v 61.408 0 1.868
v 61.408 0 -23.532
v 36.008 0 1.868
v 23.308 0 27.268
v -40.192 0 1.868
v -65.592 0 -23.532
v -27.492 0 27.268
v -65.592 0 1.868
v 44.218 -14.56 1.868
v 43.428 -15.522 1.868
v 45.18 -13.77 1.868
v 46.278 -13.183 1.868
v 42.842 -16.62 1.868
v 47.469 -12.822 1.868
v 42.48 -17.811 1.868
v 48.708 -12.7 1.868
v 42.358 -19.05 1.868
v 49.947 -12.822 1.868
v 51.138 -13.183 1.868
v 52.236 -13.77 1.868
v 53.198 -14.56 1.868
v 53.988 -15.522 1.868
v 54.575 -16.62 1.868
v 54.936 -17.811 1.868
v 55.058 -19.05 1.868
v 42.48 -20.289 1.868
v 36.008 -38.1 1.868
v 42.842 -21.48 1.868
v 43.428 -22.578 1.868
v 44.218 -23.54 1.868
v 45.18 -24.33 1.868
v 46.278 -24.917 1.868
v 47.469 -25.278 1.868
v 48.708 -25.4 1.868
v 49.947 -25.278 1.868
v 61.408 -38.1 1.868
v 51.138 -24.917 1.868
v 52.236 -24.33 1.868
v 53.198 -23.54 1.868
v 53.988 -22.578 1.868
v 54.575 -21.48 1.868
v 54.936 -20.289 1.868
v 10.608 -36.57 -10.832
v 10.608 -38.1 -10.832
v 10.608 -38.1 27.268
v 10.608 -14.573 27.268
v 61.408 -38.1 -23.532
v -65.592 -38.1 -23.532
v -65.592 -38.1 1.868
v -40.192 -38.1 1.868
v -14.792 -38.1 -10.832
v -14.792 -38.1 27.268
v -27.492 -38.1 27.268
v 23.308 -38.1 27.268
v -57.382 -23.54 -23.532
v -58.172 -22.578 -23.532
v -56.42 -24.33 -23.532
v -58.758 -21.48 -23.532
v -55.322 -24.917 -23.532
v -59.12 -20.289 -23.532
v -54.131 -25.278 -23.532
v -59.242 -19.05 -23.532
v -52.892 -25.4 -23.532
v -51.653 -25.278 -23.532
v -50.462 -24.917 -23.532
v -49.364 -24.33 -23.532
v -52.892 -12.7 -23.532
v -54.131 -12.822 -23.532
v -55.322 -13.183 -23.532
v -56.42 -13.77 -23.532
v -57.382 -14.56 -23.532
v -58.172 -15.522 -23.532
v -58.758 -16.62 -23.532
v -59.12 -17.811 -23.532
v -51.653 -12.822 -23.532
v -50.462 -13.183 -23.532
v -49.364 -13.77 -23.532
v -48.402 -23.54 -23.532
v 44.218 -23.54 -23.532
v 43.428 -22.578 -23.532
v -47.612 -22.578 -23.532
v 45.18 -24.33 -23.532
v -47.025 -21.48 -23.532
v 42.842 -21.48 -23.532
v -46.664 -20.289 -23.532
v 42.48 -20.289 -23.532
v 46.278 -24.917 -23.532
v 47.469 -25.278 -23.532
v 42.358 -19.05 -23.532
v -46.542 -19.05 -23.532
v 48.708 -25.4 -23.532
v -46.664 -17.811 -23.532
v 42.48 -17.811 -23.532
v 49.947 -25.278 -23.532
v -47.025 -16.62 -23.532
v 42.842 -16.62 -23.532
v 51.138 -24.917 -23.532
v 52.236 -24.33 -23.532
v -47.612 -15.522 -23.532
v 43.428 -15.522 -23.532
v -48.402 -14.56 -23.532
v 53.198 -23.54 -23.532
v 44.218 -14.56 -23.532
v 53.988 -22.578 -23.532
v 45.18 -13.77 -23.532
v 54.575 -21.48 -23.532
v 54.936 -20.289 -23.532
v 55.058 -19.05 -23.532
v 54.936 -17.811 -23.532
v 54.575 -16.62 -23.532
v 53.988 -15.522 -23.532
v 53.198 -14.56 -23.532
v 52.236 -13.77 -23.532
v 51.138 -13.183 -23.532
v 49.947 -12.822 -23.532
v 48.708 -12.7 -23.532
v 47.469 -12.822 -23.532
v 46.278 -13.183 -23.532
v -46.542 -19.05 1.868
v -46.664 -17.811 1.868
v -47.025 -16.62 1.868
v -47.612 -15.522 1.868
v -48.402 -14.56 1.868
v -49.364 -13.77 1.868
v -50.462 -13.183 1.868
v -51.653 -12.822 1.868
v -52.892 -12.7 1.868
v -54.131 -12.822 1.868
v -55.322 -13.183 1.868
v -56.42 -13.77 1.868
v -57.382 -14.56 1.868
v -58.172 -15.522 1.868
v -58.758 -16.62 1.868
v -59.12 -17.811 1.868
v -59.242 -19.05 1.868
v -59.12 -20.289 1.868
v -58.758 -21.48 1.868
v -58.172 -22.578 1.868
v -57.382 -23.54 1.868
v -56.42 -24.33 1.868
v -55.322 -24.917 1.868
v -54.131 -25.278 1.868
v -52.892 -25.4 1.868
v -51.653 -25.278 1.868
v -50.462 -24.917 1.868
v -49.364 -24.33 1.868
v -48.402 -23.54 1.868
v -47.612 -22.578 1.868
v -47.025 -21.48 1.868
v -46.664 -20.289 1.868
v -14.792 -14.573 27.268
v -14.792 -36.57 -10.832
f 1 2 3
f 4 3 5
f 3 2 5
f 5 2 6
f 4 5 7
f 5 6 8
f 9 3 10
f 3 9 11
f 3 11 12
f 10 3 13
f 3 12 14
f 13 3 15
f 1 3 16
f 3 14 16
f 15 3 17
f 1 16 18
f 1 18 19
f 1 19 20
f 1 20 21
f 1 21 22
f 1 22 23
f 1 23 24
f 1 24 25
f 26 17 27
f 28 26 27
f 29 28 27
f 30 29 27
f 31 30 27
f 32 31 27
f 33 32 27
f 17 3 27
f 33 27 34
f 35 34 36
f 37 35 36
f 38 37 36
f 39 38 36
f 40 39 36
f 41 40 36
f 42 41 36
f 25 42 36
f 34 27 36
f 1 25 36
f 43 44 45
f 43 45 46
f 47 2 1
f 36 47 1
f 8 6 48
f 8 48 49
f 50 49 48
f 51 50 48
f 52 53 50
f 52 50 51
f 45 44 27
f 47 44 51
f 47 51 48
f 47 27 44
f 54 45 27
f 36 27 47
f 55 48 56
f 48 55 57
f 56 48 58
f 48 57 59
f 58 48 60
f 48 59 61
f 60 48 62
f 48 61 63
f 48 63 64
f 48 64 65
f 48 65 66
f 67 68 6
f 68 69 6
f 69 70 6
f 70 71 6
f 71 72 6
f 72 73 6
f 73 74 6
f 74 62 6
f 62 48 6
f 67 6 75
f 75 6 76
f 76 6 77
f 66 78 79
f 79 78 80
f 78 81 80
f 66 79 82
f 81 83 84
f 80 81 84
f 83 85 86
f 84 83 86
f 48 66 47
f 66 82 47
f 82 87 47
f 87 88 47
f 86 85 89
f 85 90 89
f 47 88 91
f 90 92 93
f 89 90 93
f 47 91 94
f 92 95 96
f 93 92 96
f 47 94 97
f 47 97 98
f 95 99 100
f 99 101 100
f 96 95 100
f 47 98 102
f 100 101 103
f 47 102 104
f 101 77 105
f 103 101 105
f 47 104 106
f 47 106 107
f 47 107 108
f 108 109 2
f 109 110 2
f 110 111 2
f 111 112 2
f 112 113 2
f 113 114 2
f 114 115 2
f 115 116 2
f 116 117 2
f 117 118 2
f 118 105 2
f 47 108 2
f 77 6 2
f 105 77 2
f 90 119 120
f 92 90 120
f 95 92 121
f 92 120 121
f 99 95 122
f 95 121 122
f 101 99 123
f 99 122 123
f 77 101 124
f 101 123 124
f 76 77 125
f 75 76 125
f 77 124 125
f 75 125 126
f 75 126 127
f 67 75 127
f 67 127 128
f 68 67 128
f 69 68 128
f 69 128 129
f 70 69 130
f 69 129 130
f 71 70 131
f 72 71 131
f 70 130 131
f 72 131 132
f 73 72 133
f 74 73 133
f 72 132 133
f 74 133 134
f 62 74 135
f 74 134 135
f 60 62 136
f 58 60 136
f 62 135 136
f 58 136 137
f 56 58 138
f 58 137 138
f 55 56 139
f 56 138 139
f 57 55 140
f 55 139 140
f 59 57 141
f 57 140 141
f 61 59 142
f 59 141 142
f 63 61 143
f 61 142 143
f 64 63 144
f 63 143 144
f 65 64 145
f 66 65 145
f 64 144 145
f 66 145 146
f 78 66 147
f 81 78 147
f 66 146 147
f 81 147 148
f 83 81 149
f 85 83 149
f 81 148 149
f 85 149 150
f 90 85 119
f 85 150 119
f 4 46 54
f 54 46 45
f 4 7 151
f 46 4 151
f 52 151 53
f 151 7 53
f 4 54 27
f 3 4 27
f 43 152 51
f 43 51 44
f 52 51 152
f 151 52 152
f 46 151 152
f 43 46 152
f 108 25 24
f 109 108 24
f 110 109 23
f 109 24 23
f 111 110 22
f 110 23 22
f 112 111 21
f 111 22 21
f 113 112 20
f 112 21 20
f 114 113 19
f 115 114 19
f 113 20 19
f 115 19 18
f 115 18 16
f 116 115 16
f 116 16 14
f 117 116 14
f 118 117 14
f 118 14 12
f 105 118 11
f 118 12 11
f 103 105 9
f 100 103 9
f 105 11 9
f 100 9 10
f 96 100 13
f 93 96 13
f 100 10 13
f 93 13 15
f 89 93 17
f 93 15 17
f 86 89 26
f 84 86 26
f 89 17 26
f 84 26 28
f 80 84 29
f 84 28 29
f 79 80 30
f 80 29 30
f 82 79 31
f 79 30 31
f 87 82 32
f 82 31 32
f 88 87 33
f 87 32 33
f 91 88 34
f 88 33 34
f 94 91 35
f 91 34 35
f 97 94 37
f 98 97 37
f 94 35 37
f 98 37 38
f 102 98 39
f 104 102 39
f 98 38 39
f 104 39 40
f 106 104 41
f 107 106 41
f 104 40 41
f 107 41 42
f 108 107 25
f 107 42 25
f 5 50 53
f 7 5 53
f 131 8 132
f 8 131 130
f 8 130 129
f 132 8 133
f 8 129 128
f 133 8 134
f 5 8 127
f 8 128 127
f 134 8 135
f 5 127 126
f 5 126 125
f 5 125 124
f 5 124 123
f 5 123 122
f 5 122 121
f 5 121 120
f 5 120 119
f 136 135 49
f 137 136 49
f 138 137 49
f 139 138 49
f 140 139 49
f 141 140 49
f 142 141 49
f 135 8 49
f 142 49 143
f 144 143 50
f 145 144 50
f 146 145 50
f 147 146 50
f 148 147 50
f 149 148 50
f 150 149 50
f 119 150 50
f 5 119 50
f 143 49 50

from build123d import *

# Parameters (mm, degrees)
F0_W      = 127
F0_H      = 50.8
F1_DEPTH  = 38.1
F3_DEPTH  = 38.1
F4_R      = 6.35
F5_DEPTH  = 25.4
F6_R      = 6.35
F7_DEPTH  = 25.4
F8_W      = 25.4
F8_H      = 38.202004
F9_DEPTH  = 38.1
F11_DEPTH = 25.4


with BuildPart() as f1:
    # F0 (on Front) → F1 (new body)
    with BuildSketch(Plane.XZ):
        with Locations((-2.091765, 1.867647)):
            Rectangle(F0_W, F0_H)
    extrude(amount=F1_DEPTH)

    # F2 (on face) → F3 (cut)
    with BuildSketch(Plane.XZ.offset(38.1)):
        Polygon((36.008235, 1.867647), (61.408235, 1.867647), (61.408235, 27.267647), (23.308235, 27.267647), align=None)
        Polygon((-65.591765, 27.267647), (-65.591765, 1.867647), (-40.191765, 1.867647), (-27.491765, 27.267647), align=None)
    extrude(amount=-F3_DEPTH, mode=Mode.SUBTRACT)

    # F4 (on face) → F5 (cut)
    with BuildSketch(Plane.XY.offset(1.867647)):
        with Locations((48.708235, -19.05)):
            Circle(F4_R)
    extrude(amount=-F5_DEPTH, mode=Mode.SUBTRACT)

    # F6 (on face) → F7 (cut)
    with BuildSketch(Plane.XY.offset(1.867647)):
        with Locations((-52.891765, -19.05)):
            Circle(F6_R)
    extrude(amount=-F7_DEPTH, mode=Mode.SUBTRACT)

    # F8 (on face) → F9 (cut)
    with BuildSketch(Plane.XY.offset(27.267647)):
        with Locations((-2.091765, -18.998998)):
            Rectangle(F8_W, F8_H)
    extrude(amount=-F9_DEPTH, mode=Mode.SUBTRACT)

    # F10 (on face) → F11 (join)
    with BuildSketch(Plane.YZ.offset(-14.791765)):
        Polygon((-14.572936, 27.267647), (-36.569981, -10.832353), (0, -10.832353), (0, 27.267647), align=None)
    extrude(amount=F11_DEPTH)


solid = f1.part
